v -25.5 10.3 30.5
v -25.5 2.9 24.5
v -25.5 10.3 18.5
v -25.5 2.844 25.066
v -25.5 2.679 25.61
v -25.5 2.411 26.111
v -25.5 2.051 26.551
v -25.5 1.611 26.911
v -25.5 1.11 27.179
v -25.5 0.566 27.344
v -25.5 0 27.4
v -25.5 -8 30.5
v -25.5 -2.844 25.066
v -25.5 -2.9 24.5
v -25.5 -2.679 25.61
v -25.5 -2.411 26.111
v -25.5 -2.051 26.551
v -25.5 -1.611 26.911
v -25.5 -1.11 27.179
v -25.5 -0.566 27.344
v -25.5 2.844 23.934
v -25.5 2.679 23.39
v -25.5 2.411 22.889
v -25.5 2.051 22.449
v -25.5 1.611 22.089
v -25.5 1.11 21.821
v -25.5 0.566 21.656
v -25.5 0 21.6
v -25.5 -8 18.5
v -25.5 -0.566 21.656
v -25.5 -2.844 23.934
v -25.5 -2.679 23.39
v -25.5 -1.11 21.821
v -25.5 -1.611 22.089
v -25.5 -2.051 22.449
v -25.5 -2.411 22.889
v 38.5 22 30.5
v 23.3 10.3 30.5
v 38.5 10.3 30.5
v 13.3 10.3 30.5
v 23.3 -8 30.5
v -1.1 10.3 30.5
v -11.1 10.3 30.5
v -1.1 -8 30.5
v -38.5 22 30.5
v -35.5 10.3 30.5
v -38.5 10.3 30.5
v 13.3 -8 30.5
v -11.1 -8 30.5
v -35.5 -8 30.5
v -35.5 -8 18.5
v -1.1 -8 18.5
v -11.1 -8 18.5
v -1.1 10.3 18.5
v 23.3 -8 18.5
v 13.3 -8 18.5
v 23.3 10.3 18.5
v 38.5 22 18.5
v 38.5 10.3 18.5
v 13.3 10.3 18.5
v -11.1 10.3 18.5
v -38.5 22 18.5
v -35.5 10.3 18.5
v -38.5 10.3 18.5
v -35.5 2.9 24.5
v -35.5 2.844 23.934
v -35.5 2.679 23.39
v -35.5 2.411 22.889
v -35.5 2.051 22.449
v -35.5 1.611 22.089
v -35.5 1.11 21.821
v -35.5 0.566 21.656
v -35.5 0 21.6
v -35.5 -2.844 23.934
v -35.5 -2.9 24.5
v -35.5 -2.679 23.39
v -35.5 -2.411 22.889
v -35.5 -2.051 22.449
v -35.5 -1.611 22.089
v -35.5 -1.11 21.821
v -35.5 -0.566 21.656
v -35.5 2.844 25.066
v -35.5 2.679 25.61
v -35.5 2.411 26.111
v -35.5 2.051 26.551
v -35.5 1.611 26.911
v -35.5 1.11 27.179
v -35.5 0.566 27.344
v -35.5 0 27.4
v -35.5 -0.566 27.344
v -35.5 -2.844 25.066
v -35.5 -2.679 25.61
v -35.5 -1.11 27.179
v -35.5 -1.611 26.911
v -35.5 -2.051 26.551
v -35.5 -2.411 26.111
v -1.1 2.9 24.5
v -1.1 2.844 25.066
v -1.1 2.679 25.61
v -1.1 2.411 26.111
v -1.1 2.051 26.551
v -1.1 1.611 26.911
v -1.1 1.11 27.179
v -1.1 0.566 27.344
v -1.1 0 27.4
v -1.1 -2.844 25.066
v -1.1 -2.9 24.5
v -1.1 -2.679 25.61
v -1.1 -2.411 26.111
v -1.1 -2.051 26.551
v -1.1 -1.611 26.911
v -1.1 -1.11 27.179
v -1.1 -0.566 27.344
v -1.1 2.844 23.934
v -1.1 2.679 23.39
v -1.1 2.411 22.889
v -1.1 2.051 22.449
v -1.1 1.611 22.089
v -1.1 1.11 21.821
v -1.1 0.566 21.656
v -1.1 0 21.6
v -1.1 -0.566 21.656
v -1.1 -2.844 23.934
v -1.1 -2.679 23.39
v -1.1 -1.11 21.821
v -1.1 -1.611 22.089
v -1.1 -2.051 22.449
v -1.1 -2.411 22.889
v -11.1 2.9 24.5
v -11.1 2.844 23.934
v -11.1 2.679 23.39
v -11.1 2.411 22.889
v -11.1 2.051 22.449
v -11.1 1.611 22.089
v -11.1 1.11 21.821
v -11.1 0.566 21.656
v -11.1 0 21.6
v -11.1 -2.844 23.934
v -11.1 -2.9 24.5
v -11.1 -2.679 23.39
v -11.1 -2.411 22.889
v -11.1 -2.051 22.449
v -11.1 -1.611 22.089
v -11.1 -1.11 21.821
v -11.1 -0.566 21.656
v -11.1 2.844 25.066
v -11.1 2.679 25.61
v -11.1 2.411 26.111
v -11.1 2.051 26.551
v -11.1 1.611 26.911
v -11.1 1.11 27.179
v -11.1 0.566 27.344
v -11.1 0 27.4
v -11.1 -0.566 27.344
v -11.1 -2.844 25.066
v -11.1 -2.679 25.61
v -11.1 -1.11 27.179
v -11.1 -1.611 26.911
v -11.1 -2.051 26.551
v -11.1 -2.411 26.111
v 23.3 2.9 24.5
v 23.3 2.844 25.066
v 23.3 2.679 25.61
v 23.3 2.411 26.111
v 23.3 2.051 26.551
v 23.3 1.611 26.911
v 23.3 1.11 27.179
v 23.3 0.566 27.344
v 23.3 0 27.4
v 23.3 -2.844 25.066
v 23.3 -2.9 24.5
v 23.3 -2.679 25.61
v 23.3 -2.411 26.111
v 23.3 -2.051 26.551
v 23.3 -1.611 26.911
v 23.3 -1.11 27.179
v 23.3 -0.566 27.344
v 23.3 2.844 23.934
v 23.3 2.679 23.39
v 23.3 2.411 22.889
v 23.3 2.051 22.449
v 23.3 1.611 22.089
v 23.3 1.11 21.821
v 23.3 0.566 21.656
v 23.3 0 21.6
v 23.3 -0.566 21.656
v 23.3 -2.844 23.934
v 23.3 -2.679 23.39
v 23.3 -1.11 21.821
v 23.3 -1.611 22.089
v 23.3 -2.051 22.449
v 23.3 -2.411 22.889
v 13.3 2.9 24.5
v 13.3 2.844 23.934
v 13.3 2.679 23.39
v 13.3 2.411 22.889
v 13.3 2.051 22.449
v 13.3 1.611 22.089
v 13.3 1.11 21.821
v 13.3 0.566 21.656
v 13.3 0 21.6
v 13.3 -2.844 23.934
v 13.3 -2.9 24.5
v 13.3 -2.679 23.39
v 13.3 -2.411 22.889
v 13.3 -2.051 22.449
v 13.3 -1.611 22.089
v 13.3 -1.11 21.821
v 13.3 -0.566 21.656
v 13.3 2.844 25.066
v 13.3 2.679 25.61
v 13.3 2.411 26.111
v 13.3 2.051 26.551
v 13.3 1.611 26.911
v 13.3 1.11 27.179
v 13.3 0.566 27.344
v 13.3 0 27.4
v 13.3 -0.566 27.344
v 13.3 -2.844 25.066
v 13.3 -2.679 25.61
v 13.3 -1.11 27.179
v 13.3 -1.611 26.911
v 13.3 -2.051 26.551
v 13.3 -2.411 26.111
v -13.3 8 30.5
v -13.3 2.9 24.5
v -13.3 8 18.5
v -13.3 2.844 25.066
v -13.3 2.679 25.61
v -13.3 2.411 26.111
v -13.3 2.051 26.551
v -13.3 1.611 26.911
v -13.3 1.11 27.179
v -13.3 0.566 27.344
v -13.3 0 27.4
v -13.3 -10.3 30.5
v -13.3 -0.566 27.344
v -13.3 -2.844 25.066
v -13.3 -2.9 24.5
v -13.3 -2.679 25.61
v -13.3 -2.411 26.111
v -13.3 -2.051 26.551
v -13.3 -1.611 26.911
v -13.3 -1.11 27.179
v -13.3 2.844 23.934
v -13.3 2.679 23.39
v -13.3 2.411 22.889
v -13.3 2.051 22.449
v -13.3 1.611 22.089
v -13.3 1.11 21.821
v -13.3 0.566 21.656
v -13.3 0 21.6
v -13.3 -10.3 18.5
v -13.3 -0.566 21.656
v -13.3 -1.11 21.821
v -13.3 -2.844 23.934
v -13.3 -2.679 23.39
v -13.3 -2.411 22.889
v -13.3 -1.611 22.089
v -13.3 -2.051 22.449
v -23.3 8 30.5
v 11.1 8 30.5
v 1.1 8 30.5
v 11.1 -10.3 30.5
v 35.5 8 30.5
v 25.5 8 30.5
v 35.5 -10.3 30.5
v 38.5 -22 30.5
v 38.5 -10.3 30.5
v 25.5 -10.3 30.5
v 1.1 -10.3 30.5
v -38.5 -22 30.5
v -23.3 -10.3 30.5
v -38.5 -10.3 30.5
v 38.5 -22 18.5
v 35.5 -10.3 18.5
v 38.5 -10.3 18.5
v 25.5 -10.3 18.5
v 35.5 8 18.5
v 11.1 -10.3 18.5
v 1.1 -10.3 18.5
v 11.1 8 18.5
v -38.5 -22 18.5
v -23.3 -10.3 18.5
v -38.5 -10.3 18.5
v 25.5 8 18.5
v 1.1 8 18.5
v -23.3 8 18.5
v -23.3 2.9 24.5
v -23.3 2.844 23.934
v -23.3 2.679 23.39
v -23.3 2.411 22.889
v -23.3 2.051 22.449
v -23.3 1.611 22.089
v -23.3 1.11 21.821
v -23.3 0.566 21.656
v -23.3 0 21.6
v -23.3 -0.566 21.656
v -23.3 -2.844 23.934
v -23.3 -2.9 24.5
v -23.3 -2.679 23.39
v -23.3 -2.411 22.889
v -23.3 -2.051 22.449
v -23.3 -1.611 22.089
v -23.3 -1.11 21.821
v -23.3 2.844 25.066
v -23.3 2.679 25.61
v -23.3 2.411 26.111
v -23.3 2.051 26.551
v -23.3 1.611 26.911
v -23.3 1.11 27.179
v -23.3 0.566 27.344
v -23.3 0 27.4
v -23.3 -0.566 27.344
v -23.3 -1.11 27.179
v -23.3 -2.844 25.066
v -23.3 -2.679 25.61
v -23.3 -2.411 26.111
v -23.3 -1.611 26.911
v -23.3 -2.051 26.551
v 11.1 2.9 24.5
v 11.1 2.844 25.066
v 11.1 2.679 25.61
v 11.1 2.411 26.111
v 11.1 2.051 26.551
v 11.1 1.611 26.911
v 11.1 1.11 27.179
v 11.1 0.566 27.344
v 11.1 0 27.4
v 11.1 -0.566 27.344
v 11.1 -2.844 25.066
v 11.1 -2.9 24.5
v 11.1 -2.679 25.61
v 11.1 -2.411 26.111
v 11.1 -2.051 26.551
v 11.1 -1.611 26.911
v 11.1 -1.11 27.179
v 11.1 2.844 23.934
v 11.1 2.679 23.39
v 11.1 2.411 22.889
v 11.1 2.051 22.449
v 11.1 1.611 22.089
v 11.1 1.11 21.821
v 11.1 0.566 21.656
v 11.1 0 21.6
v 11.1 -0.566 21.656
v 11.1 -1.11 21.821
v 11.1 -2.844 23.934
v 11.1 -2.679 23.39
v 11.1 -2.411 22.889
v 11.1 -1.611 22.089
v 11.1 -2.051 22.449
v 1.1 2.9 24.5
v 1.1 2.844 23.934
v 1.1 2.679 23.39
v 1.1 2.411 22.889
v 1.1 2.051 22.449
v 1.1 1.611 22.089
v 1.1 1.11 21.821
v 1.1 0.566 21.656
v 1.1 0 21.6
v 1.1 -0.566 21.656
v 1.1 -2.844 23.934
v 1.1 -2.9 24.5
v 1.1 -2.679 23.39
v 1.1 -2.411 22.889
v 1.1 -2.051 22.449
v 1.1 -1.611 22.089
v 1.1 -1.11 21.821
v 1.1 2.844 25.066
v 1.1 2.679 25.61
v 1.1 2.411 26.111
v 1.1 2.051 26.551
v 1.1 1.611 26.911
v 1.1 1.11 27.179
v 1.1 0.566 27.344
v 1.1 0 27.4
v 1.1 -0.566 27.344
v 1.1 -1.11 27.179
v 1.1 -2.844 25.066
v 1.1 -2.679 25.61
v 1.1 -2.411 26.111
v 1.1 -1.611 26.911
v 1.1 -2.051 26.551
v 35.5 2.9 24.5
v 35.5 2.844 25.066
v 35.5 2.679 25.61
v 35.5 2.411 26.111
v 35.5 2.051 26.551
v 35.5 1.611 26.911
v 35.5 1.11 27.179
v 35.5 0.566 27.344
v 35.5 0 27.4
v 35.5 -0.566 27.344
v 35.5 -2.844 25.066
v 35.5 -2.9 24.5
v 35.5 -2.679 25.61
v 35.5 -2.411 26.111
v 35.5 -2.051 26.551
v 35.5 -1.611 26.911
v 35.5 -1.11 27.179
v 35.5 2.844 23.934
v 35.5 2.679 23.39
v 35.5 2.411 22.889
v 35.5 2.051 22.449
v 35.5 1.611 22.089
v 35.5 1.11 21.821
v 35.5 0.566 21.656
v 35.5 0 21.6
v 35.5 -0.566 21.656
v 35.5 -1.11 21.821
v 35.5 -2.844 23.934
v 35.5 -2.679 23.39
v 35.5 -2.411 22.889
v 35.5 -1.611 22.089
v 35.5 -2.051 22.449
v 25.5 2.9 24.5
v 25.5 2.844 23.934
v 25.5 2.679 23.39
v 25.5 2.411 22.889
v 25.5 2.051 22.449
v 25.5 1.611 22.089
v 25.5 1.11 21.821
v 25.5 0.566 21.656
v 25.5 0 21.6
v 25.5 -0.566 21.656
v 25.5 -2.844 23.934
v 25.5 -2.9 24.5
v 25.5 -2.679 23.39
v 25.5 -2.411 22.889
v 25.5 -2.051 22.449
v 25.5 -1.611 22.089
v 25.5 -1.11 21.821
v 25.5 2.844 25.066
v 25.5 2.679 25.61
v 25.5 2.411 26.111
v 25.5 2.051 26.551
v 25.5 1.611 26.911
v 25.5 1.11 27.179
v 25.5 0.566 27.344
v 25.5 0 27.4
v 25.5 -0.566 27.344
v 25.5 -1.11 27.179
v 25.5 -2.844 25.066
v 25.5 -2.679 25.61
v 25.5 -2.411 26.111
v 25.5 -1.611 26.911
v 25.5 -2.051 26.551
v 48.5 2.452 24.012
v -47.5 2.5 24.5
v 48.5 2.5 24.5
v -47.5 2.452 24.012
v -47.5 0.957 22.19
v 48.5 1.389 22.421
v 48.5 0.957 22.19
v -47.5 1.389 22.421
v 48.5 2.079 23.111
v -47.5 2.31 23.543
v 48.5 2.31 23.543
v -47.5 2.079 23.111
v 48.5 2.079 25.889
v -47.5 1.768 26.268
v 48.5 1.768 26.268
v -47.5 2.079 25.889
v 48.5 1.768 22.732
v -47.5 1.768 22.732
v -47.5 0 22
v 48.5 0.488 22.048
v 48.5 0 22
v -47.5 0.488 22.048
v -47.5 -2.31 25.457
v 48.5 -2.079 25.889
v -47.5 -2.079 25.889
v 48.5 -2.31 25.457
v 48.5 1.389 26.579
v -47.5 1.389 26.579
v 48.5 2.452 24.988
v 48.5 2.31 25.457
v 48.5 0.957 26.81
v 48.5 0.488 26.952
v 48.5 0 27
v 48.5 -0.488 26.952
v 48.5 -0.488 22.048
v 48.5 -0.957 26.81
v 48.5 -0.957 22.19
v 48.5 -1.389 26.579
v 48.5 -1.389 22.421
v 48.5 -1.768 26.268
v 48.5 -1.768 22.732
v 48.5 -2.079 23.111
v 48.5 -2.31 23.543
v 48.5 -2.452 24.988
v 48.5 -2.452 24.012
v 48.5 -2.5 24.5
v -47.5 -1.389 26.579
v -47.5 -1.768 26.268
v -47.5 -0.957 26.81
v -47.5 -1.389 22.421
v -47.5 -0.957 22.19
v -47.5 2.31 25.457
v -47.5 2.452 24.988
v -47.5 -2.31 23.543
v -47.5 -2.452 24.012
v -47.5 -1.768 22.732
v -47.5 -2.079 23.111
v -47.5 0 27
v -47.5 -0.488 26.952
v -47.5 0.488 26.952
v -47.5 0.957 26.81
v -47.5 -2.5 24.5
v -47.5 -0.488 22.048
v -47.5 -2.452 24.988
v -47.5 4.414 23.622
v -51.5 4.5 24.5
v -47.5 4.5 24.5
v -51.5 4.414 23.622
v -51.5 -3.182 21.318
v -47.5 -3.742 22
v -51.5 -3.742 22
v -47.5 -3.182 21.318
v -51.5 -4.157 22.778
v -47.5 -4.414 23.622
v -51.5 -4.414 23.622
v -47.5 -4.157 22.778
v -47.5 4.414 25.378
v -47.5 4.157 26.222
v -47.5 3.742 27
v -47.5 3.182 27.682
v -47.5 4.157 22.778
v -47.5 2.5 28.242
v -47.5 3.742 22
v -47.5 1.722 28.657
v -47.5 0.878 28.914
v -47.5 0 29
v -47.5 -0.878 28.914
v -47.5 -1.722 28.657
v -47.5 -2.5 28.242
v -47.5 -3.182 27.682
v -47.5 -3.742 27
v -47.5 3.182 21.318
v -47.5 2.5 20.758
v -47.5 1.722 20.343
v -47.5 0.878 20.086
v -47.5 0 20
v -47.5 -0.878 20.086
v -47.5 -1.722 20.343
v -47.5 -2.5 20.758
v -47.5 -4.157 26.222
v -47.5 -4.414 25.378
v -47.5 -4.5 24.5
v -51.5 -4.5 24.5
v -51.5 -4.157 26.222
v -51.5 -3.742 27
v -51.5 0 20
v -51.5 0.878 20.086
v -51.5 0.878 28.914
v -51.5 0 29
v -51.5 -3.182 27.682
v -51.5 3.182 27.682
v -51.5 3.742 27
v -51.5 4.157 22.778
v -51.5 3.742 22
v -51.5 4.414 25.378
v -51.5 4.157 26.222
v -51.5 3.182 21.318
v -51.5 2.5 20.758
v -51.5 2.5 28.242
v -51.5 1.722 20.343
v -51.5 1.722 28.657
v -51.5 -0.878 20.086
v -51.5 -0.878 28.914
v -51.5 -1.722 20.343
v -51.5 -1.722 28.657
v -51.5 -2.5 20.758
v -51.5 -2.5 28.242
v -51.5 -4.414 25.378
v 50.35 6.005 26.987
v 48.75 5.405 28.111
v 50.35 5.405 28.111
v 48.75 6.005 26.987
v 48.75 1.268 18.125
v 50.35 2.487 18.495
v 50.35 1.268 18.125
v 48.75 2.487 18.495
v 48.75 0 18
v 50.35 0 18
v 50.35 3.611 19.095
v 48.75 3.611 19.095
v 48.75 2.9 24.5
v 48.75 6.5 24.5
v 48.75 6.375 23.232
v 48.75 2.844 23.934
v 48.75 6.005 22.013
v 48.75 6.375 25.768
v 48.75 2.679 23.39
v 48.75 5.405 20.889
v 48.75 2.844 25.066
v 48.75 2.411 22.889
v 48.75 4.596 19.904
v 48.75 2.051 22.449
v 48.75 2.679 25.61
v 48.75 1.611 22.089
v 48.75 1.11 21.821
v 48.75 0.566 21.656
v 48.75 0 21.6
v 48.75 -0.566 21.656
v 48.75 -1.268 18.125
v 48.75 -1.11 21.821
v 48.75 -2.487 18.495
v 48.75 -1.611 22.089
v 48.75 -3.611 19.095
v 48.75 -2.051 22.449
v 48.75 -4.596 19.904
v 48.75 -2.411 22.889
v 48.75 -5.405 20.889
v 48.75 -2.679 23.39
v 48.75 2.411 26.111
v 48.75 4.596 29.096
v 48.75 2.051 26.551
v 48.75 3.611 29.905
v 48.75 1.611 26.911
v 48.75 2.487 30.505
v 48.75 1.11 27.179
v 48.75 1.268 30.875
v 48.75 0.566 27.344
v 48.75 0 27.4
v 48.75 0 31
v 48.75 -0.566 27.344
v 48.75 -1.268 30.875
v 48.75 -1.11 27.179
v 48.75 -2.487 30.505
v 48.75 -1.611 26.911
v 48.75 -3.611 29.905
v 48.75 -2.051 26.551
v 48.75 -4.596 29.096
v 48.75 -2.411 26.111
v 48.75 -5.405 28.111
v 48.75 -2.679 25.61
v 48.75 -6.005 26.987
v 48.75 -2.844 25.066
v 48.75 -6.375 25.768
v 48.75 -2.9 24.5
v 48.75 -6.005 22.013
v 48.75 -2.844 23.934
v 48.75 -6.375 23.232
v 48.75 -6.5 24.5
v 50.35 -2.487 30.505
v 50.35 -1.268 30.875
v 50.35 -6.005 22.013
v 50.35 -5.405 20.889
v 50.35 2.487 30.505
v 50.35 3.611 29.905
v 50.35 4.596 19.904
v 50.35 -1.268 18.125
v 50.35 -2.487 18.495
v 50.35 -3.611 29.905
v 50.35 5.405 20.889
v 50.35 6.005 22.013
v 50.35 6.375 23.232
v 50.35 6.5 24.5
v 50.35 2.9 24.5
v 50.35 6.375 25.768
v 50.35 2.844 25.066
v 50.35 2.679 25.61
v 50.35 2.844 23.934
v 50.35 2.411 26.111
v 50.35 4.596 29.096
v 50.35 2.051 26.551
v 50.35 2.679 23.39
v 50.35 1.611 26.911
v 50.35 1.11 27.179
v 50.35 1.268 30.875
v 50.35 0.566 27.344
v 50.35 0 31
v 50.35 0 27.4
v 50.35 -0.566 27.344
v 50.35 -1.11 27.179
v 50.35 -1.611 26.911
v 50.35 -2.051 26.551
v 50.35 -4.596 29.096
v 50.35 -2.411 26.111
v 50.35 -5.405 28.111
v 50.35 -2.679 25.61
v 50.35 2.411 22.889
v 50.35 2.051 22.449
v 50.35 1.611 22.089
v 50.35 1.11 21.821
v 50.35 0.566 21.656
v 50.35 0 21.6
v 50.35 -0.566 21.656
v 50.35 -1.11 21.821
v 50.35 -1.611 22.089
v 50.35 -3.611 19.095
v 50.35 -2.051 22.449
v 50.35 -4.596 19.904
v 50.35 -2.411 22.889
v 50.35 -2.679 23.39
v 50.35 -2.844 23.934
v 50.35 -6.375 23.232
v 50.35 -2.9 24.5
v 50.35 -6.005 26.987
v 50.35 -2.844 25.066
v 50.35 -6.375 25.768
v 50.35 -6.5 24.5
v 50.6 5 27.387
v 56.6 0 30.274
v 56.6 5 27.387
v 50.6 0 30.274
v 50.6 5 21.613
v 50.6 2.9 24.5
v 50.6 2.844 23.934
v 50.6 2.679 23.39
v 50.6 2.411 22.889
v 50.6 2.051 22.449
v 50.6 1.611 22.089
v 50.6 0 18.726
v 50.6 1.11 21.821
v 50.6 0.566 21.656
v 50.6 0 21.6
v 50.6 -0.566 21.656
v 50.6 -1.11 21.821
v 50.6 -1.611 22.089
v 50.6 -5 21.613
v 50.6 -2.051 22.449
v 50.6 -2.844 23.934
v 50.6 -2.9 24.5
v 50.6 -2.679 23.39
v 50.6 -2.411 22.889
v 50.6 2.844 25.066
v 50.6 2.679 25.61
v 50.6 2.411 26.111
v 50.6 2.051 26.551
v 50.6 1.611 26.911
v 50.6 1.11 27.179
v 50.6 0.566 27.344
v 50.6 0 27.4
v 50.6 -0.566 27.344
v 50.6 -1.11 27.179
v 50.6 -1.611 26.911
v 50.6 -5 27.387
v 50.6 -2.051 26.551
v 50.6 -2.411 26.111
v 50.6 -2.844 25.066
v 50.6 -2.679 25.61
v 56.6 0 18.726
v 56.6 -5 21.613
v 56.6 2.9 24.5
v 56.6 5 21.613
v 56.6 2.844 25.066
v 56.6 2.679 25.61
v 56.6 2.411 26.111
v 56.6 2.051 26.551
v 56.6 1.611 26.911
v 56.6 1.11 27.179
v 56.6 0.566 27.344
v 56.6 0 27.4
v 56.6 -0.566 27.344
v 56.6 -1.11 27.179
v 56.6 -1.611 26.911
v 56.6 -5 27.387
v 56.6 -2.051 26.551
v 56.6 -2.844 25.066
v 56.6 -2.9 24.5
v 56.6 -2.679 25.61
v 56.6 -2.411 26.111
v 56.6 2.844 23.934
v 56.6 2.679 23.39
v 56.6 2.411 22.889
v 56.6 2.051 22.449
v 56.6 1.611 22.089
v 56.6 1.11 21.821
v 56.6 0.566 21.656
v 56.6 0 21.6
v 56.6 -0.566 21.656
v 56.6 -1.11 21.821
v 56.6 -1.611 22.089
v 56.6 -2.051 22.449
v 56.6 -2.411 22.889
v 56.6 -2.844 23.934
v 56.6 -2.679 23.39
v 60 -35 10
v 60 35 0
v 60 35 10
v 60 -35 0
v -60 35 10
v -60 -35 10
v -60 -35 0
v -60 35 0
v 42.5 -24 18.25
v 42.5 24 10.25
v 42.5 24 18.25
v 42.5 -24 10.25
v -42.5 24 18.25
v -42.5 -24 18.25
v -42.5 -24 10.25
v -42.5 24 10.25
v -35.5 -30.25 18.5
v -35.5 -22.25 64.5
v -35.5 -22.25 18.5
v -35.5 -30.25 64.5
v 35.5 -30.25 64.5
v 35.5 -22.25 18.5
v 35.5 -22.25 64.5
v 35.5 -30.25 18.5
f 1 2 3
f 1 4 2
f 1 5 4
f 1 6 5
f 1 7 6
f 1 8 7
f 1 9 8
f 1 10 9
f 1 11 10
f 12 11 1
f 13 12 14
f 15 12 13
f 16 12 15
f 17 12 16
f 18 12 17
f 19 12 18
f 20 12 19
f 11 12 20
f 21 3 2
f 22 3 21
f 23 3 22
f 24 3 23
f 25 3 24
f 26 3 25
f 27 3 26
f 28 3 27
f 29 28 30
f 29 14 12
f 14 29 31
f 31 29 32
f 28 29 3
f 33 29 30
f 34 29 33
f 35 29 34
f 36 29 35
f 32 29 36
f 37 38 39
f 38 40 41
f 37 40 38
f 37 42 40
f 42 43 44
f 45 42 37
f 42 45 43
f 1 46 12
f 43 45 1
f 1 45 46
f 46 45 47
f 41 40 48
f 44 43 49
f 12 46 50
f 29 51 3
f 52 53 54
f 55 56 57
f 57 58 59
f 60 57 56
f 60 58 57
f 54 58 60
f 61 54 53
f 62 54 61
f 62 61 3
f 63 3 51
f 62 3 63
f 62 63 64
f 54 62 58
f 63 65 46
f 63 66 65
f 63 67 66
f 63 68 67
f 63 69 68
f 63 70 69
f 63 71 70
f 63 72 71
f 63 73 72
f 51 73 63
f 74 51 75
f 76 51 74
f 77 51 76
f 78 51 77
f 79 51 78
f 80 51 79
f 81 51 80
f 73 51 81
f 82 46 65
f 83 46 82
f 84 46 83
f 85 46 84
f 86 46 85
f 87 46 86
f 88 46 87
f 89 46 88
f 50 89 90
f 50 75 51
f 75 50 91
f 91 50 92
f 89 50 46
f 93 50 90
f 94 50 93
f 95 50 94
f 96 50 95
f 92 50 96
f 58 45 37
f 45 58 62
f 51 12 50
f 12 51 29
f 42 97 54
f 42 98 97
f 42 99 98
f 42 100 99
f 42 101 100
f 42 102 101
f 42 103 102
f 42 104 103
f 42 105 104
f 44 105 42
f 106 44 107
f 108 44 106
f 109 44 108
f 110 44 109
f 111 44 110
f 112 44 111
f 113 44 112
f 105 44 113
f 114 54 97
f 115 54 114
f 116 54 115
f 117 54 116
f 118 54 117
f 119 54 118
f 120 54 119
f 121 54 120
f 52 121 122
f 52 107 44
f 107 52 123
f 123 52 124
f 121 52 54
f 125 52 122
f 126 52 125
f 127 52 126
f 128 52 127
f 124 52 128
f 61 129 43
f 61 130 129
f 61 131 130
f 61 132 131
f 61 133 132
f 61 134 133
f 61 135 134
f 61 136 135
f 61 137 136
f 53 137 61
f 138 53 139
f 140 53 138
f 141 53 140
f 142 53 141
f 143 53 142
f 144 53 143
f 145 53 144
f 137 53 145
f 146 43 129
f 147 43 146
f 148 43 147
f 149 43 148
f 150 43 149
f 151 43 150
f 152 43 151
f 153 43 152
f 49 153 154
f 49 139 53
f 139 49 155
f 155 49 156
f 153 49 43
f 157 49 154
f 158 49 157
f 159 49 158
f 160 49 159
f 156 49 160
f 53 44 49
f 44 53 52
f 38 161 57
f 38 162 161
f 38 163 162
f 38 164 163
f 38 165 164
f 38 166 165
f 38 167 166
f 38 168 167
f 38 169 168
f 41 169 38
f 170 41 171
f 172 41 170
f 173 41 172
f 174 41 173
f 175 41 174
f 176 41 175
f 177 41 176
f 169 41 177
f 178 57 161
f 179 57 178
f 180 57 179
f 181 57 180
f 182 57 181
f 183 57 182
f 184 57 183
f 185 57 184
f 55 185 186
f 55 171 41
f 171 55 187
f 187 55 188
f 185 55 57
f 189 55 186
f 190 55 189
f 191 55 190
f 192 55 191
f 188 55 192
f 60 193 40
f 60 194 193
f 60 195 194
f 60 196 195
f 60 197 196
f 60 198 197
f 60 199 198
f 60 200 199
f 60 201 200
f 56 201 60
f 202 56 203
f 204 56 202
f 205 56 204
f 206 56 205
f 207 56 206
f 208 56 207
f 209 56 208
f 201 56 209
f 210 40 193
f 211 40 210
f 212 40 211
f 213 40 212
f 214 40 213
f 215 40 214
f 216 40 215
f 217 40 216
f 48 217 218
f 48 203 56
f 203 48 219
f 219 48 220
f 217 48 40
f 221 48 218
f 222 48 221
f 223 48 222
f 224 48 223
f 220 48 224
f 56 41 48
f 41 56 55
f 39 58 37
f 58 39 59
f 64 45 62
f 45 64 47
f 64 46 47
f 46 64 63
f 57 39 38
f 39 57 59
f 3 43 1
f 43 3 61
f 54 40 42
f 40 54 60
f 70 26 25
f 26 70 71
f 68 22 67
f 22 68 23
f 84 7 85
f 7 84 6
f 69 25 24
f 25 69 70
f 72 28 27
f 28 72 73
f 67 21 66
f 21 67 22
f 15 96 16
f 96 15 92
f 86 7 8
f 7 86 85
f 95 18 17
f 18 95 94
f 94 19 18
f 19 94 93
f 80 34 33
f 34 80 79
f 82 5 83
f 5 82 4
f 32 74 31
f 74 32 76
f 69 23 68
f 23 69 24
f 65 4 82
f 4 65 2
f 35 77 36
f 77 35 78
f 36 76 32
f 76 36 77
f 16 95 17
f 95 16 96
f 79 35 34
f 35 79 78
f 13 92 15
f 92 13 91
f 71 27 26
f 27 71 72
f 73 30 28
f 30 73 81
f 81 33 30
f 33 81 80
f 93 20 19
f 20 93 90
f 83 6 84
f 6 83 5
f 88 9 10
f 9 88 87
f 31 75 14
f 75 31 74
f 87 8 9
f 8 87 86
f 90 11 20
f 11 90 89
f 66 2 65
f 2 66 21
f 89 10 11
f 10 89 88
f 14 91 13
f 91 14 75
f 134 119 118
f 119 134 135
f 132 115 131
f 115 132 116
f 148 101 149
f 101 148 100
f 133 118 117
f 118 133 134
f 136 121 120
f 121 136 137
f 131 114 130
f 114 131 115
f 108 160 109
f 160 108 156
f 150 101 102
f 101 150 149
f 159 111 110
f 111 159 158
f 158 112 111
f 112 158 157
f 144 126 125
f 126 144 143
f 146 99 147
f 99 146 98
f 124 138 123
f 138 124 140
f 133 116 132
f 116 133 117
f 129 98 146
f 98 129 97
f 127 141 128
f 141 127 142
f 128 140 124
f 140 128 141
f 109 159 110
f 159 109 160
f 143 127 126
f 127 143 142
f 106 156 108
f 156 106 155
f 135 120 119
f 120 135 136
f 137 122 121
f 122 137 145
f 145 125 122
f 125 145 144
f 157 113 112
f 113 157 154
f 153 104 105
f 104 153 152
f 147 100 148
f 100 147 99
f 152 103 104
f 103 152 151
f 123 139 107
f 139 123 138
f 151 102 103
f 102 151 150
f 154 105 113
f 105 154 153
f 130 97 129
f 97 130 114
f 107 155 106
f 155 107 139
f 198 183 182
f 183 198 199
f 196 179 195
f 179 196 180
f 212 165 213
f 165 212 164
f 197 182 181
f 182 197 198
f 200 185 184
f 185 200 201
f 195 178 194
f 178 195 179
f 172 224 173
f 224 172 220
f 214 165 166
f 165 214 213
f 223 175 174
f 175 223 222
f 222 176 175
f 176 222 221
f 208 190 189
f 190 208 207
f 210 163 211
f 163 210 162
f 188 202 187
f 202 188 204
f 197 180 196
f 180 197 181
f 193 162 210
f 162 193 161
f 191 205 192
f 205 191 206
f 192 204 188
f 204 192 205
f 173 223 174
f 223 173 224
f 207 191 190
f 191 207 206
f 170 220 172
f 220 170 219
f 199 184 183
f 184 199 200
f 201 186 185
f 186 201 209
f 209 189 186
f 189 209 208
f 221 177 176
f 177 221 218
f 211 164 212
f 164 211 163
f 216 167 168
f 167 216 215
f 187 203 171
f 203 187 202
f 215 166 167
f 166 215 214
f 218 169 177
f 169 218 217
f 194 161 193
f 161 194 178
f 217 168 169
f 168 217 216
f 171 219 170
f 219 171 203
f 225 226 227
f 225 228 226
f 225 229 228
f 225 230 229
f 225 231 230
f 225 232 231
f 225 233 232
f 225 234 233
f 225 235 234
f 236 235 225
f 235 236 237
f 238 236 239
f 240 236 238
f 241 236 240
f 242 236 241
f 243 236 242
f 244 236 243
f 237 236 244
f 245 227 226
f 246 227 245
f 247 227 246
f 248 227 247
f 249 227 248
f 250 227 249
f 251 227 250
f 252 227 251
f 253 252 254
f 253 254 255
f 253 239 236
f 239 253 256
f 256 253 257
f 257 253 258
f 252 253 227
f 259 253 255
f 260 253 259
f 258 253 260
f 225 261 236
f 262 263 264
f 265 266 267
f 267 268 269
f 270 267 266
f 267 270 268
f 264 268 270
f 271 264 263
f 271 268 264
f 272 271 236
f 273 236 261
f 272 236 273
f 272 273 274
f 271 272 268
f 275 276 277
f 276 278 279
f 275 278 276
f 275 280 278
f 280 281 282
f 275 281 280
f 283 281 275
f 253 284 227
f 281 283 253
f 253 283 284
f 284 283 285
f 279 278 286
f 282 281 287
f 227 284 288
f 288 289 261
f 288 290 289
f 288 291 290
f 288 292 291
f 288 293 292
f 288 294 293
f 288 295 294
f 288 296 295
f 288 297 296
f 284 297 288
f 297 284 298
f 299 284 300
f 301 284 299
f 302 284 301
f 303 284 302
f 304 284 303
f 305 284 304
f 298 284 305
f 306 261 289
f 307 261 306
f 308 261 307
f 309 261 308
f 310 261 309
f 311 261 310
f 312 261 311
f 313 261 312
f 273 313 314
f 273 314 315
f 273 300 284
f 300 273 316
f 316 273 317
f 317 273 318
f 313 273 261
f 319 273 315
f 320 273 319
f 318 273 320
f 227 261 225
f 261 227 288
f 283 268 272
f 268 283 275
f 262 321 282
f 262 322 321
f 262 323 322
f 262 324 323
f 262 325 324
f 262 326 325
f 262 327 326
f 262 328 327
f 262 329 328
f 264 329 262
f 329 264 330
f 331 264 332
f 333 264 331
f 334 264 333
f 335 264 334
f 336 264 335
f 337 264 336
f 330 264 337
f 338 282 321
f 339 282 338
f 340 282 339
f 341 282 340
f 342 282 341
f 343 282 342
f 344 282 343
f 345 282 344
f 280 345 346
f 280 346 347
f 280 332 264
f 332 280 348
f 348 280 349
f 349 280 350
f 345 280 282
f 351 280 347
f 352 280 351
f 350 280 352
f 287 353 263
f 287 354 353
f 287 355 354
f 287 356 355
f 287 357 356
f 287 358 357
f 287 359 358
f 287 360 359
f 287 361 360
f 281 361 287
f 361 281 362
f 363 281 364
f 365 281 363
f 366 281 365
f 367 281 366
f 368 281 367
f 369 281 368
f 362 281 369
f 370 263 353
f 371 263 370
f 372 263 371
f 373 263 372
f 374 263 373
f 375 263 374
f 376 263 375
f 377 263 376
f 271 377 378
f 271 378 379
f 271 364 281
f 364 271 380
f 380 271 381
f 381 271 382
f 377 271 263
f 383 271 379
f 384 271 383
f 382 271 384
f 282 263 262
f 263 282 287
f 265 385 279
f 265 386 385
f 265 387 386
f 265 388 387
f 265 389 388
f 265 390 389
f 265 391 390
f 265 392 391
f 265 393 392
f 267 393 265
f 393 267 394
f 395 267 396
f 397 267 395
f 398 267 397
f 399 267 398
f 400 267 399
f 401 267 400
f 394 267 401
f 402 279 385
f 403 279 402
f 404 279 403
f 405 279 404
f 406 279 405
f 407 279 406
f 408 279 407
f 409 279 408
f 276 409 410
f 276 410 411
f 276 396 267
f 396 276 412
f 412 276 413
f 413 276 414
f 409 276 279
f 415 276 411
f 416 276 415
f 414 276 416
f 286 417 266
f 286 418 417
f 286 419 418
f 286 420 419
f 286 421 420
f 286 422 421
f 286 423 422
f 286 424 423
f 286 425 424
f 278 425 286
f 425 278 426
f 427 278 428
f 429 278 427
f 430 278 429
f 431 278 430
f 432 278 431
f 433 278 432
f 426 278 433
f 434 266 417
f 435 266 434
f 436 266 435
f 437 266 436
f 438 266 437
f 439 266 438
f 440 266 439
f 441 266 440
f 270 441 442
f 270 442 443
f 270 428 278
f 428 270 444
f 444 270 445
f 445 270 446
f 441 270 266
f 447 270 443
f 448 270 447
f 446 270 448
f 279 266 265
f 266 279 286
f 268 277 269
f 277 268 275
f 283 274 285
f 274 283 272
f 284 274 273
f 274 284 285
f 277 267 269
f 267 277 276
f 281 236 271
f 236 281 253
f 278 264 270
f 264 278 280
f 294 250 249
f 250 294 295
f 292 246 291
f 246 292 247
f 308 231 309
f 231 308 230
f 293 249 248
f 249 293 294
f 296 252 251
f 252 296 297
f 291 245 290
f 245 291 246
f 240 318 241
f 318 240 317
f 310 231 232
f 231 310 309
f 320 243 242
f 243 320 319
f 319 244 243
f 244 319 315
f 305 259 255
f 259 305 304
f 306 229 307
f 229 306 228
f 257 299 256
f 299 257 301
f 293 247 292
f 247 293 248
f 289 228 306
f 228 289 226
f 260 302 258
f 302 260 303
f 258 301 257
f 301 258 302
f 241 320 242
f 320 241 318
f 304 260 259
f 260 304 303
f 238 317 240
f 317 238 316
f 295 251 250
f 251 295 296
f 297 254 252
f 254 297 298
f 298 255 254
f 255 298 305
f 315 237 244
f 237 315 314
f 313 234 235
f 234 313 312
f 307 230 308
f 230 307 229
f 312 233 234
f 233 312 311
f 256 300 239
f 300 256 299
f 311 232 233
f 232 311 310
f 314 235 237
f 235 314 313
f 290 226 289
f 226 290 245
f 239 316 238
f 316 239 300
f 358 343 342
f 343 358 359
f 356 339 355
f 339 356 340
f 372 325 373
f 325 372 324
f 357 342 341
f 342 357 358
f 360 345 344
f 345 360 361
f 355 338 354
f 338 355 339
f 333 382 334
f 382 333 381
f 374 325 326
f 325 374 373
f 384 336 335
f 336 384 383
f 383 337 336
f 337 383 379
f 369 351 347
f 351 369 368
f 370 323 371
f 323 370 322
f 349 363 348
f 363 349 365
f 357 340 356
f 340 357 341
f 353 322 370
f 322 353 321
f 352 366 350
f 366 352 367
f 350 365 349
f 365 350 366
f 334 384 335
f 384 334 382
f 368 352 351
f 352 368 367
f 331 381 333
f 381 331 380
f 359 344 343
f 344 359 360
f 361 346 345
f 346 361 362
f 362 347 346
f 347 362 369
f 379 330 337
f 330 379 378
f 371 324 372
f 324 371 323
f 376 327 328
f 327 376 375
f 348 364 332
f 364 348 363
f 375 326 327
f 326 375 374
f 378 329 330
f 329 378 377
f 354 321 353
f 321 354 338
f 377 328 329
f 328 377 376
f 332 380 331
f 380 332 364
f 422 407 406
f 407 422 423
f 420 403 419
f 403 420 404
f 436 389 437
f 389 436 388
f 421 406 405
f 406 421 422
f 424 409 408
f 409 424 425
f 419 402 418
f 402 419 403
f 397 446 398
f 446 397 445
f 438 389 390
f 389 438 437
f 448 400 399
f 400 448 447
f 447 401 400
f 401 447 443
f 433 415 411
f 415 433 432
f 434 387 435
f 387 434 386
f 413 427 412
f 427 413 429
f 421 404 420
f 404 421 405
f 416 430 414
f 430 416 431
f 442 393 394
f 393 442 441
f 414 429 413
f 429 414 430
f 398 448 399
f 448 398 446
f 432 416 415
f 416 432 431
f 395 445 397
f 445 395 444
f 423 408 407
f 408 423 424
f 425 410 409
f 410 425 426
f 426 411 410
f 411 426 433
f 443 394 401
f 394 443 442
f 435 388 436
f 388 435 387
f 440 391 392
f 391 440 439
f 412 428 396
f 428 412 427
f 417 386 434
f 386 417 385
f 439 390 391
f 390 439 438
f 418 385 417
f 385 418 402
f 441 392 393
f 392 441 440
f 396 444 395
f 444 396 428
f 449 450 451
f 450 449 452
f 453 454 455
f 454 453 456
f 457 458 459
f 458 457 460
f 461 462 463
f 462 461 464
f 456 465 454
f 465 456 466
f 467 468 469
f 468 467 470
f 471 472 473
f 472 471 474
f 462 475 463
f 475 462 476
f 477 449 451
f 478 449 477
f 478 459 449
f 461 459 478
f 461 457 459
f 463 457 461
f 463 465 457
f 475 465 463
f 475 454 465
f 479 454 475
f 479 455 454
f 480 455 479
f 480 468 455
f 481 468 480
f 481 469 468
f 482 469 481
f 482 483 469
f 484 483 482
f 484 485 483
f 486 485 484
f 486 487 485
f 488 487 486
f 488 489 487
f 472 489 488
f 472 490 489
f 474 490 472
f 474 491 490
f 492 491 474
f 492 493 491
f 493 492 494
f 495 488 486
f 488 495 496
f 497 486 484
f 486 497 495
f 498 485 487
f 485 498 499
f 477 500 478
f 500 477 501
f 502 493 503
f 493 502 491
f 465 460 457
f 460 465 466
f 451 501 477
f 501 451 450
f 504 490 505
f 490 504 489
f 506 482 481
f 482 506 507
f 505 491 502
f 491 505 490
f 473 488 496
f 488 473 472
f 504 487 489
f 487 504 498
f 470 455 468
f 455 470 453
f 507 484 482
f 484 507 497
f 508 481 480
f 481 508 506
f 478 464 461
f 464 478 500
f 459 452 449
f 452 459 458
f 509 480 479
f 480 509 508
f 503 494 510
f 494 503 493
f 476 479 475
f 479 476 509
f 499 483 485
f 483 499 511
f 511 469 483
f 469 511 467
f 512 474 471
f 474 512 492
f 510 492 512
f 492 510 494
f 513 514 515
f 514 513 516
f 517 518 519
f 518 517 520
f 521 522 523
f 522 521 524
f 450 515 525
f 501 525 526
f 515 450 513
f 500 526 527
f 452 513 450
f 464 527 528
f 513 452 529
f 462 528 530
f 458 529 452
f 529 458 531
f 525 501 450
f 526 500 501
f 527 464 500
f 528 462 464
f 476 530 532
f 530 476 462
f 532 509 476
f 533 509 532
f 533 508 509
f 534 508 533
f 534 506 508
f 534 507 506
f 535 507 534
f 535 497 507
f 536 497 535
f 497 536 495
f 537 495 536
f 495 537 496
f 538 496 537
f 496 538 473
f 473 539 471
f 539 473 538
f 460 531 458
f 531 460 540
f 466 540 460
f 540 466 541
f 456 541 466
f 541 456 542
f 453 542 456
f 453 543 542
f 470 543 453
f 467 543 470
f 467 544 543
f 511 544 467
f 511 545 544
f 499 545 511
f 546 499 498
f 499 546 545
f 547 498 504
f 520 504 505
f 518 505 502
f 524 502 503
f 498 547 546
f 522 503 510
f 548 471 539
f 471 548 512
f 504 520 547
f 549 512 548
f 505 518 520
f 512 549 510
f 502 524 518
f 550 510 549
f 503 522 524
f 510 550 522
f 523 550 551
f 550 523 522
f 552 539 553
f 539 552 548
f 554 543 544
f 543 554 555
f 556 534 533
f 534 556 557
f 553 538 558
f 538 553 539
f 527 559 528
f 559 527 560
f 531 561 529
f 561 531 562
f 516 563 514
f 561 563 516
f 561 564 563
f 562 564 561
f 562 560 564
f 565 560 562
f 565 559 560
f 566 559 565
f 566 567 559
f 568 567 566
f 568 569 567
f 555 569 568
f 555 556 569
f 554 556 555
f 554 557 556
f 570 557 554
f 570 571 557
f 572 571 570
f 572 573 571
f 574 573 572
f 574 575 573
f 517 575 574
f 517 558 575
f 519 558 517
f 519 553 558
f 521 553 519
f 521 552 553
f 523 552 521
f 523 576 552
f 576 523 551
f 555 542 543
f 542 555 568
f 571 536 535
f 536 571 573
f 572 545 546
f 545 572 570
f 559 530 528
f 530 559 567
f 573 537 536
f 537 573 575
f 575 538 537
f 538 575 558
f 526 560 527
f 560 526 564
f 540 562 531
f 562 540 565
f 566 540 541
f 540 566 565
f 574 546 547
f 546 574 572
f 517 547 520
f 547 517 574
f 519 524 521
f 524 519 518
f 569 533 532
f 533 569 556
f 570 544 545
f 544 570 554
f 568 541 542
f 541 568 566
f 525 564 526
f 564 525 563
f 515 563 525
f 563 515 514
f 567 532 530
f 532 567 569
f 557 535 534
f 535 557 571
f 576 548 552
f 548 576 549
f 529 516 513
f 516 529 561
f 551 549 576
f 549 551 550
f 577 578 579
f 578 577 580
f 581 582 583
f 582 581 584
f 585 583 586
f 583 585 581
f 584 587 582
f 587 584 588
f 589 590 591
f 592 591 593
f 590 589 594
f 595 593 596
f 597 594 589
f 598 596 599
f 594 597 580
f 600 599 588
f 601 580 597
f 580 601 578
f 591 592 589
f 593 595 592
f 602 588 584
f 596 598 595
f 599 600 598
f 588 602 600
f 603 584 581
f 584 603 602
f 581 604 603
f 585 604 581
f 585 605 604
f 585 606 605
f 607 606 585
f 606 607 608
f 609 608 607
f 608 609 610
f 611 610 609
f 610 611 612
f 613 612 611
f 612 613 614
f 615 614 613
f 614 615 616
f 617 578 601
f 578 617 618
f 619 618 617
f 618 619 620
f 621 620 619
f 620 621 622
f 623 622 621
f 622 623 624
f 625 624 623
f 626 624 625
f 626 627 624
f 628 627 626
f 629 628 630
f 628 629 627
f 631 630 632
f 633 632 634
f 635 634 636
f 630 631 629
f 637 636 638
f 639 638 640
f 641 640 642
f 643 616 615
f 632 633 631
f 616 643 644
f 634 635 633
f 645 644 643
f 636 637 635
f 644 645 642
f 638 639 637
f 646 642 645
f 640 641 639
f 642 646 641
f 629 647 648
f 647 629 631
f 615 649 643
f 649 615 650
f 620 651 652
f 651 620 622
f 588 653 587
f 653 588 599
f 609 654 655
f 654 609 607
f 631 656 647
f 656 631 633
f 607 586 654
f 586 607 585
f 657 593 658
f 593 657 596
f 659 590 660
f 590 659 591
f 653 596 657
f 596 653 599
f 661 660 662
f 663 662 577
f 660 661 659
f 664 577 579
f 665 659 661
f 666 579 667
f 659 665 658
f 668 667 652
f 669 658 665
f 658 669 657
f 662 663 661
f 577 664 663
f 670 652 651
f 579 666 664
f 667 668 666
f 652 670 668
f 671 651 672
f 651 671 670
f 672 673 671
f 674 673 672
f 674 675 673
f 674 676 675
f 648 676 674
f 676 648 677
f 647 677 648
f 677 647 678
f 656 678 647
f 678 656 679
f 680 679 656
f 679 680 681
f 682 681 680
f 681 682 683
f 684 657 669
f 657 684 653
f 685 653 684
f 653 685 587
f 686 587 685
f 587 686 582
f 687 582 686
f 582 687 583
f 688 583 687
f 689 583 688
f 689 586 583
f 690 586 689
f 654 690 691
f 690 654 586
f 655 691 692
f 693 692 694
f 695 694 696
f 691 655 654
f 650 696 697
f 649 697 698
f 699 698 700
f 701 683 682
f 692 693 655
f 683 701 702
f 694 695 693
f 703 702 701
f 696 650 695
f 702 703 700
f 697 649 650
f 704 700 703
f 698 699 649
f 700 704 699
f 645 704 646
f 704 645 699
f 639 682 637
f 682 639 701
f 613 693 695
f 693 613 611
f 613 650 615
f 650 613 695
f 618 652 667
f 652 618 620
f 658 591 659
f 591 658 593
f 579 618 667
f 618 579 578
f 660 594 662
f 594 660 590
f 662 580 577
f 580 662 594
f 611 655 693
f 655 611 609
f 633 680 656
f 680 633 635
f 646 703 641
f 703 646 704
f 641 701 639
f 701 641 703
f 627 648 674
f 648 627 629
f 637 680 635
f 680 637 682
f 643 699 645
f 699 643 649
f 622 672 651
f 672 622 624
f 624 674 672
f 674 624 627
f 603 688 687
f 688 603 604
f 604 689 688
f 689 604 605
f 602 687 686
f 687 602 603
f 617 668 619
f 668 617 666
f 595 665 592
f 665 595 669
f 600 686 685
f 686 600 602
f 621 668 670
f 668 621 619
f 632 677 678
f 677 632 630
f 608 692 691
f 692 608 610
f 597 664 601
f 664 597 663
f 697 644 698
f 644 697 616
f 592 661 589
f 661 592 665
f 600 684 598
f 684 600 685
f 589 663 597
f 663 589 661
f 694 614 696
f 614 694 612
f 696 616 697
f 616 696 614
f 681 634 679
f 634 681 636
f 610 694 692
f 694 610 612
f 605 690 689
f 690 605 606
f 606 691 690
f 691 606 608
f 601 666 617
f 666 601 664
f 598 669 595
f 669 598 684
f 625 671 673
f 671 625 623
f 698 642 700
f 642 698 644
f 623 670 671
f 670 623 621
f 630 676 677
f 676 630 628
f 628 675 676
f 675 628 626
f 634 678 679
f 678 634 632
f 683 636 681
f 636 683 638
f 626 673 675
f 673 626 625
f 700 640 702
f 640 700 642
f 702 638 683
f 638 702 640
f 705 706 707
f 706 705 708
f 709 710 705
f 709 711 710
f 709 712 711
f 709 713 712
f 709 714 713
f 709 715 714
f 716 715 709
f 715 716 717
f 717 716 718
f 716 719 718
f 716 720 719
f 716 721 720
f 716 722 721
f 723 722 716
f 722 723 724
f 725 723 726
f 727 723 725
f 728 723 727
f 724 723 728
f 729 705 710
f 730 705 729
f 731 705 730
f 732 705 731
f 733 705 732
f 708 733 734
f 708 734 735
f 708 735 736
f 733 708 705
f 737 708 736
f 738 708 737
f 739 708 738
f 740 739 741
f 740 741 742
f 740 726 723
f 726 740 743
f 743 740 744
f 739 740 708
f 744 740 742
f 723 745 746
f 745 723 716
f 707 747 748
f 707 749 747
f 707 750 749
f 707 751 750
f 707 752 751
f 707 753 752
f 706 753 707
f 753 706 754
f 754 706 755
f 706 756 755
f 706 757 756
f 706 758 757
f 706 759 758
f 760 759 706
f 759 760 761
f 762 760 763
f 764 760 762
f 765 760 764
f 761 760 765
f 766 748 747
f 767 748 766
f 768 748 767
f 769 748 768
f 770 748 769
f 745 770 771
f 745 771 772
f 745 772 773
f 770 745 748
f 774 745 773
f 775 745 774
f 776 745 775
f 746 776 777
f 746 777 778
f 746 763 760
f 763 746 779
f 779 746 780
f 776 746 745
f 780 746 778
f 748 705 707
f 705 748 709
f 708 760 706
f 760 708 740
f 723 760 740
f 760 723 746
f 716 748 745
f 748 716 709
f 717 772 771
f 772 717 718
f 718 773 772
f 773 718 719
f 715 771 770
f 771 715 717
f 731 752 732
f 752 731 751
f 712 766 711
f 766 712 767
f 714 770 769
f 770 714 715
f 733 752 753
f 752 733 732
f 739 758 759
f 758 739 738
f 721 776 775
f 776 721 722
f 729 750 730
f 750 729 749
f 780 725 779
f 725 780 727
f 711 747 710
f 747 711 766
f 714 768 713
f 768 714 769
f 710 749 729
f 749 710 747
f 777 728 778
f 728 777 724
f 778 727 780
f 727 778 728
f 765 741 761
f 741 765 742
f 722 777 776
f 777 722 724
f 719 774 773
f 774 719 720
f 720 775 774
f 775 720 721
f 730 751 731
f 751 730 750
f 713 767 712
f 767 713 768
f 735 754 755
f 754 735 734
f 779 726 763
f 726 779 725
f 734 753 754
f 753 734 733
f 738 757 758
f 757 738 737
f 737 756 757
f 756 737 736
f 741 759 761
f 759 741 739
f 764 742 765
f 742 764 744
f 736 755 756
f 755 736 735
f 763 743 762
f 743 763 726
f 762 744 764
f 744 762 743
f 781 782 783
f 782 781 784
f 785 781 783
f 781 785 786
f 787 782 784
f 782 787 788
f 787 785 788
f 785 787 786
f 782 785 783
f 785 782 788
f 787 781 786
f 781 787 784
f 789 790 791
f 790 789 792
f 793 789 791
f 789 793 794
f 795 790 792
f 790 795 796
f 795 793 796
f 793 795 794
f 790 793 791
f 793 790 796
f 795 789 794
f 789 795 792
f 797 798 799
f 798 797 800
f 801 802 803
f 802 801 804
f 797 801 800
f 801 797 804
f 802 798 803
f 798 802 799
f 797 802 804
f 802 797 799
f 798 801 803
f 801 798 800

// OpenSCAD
$fn = 32;

// ------------------------------------------------------------------------
// Comb hinge with flap: leaf 77 x 22 mm, pin d5, flap 46 mm
// Every part is its own module, assembly() places every instance.
// ------------------------------------------------------------------------

// --- part 1 ---
module hinge_bed() {
  difference() {
    translate([-60, -35, 0]) cube([120, 70, 10]);
  }
}

// --- part 2 ---
module hinge_riser() {
  difference() {
    translate([-42.5, -24, 0]) cube([85, 48, 8]);
  }
}

// --- part 3 ---
module hinge_leaf_a() {
  difference() {
    union() {
      translate([-35.5, -8, -6]) cube([10, 30, 12]);
      translate([-11.1, -8, -6]) cube([10, 30, 12]);
      translate([13.3, -8, -6]) cube([10, 30, 12]);
      translate([-38.5, 10.3, -6]) cube([77, 11.7, 12]);
    }
    translate([-30.5, 0, 0]) rotate([0, 90, 0]) cylinder(h = 12, d = 5.8, center = true);
    translate([-6.1, 0, 0]) rotate([0, 90, 0]) cylinder(h = 12, d = 5.8, center = true);
    translate([18.3, 0, 0]) rotate([0, 90, 0]) cylinder(h = 12, d = 5.8, center = true);
  }
}

// --- part 4 ---
module hinge_leaf_b() {
  difference() {
    union() {
      translate([-23.3, -22, -6]) cube([10, 30, 12]);
      translate([1.1, -22, -6]) cube([10, 30, 12]);
      translate([25.5, -22, -6]) cube([10, 30, 12]);
      translate([-38.5, -22, -6]) cube([77, 11.7, 12]);
    }
    translate([-18.3, 0, 0]) rotate([0, 90, 0]) cylinder(h = 12, d = 5.8, center = true);
    translate([6.1, 0, 0]) rotate([0, 90, 0]) cylinder(h = 12, d = 5.8, center = true);
    translate([30.5, 0, 0]) rotate([0, 90, 0]) cylinder(h = 12, d = 5.8, center = true);
  }
}

// --- part 5 ---
module hinge_flap() {
  difference() {
    translate([-35.5, -23, 0]) cube([71, 46, 8]);
  }
}

// --- part 6 ---
module hinge_pin() {
  rotate([0, 90, 0]) cylinder(h = 97, d = 5, center = true);
  translate([-51.5, 0, 0]) rotate([0, 90, 0]) cylinder(h = 4, d = 9);
}

// --- part 7 ---
module pin_washer() {
  difference() {
      translate([0, 0, 0]) cylinder(h = 1.6, d = 13);
      translate([0, 0, -1]) cylinder(h = 3.6, d = 5.8);
    }
}

// --- part 8 ---
module pin_nut() {
  difference() {
    linear_extrude(height = 6) polygon(points = [[5.774, 0], [2.887, 5], [-2.887, 5], [-5.774, 0], [-2.887, -5], [2.887, -5]]);
    translate([0, 0, -1]) cylinder(h = 8, d = 5.8);
  }
}

// --- assembly ---
module assembly() {
  color([0.80, 0.24, 0.20]) translate([0, 0, 0]) rotate([0, 0, 0]) hinge_bed();
  color([0.20, 0.45, 0.75]) translate([0, 0, 10.25]) rotate([0, 0, 0]) hinge_riser();
  color([0.25, 0.62, 0.32]) translate([0, 0, 24.5]) rotate([0, 0, 0]) hinge_leaf_a();
  color([0.92, 0.70, 0.18]) translate([0, 0, 24.5]) rotate([0, 0, 0]) hinge_leaf_b();
  color([0.58, 0.35, 0.70]) translate([0, -22.25, 41.5]) rotate([90, 0, 0]) hinge_flap();
  color([0.16, 0.66, 0.66]) translate([0, 0, 24.5]) rotate([0, 0, 0]) hinge_pin();
  color([0.85, 0.48, 0.18]) translate([48.75, 0, 24.5]) rotate([0, 90, 0]) pin_washer();
  color([0.55, 0.60, 0.65]) translate([50.6, 0, 24.5]) rotate([0, 90, 0]) pin_nut();
}

assembly();
